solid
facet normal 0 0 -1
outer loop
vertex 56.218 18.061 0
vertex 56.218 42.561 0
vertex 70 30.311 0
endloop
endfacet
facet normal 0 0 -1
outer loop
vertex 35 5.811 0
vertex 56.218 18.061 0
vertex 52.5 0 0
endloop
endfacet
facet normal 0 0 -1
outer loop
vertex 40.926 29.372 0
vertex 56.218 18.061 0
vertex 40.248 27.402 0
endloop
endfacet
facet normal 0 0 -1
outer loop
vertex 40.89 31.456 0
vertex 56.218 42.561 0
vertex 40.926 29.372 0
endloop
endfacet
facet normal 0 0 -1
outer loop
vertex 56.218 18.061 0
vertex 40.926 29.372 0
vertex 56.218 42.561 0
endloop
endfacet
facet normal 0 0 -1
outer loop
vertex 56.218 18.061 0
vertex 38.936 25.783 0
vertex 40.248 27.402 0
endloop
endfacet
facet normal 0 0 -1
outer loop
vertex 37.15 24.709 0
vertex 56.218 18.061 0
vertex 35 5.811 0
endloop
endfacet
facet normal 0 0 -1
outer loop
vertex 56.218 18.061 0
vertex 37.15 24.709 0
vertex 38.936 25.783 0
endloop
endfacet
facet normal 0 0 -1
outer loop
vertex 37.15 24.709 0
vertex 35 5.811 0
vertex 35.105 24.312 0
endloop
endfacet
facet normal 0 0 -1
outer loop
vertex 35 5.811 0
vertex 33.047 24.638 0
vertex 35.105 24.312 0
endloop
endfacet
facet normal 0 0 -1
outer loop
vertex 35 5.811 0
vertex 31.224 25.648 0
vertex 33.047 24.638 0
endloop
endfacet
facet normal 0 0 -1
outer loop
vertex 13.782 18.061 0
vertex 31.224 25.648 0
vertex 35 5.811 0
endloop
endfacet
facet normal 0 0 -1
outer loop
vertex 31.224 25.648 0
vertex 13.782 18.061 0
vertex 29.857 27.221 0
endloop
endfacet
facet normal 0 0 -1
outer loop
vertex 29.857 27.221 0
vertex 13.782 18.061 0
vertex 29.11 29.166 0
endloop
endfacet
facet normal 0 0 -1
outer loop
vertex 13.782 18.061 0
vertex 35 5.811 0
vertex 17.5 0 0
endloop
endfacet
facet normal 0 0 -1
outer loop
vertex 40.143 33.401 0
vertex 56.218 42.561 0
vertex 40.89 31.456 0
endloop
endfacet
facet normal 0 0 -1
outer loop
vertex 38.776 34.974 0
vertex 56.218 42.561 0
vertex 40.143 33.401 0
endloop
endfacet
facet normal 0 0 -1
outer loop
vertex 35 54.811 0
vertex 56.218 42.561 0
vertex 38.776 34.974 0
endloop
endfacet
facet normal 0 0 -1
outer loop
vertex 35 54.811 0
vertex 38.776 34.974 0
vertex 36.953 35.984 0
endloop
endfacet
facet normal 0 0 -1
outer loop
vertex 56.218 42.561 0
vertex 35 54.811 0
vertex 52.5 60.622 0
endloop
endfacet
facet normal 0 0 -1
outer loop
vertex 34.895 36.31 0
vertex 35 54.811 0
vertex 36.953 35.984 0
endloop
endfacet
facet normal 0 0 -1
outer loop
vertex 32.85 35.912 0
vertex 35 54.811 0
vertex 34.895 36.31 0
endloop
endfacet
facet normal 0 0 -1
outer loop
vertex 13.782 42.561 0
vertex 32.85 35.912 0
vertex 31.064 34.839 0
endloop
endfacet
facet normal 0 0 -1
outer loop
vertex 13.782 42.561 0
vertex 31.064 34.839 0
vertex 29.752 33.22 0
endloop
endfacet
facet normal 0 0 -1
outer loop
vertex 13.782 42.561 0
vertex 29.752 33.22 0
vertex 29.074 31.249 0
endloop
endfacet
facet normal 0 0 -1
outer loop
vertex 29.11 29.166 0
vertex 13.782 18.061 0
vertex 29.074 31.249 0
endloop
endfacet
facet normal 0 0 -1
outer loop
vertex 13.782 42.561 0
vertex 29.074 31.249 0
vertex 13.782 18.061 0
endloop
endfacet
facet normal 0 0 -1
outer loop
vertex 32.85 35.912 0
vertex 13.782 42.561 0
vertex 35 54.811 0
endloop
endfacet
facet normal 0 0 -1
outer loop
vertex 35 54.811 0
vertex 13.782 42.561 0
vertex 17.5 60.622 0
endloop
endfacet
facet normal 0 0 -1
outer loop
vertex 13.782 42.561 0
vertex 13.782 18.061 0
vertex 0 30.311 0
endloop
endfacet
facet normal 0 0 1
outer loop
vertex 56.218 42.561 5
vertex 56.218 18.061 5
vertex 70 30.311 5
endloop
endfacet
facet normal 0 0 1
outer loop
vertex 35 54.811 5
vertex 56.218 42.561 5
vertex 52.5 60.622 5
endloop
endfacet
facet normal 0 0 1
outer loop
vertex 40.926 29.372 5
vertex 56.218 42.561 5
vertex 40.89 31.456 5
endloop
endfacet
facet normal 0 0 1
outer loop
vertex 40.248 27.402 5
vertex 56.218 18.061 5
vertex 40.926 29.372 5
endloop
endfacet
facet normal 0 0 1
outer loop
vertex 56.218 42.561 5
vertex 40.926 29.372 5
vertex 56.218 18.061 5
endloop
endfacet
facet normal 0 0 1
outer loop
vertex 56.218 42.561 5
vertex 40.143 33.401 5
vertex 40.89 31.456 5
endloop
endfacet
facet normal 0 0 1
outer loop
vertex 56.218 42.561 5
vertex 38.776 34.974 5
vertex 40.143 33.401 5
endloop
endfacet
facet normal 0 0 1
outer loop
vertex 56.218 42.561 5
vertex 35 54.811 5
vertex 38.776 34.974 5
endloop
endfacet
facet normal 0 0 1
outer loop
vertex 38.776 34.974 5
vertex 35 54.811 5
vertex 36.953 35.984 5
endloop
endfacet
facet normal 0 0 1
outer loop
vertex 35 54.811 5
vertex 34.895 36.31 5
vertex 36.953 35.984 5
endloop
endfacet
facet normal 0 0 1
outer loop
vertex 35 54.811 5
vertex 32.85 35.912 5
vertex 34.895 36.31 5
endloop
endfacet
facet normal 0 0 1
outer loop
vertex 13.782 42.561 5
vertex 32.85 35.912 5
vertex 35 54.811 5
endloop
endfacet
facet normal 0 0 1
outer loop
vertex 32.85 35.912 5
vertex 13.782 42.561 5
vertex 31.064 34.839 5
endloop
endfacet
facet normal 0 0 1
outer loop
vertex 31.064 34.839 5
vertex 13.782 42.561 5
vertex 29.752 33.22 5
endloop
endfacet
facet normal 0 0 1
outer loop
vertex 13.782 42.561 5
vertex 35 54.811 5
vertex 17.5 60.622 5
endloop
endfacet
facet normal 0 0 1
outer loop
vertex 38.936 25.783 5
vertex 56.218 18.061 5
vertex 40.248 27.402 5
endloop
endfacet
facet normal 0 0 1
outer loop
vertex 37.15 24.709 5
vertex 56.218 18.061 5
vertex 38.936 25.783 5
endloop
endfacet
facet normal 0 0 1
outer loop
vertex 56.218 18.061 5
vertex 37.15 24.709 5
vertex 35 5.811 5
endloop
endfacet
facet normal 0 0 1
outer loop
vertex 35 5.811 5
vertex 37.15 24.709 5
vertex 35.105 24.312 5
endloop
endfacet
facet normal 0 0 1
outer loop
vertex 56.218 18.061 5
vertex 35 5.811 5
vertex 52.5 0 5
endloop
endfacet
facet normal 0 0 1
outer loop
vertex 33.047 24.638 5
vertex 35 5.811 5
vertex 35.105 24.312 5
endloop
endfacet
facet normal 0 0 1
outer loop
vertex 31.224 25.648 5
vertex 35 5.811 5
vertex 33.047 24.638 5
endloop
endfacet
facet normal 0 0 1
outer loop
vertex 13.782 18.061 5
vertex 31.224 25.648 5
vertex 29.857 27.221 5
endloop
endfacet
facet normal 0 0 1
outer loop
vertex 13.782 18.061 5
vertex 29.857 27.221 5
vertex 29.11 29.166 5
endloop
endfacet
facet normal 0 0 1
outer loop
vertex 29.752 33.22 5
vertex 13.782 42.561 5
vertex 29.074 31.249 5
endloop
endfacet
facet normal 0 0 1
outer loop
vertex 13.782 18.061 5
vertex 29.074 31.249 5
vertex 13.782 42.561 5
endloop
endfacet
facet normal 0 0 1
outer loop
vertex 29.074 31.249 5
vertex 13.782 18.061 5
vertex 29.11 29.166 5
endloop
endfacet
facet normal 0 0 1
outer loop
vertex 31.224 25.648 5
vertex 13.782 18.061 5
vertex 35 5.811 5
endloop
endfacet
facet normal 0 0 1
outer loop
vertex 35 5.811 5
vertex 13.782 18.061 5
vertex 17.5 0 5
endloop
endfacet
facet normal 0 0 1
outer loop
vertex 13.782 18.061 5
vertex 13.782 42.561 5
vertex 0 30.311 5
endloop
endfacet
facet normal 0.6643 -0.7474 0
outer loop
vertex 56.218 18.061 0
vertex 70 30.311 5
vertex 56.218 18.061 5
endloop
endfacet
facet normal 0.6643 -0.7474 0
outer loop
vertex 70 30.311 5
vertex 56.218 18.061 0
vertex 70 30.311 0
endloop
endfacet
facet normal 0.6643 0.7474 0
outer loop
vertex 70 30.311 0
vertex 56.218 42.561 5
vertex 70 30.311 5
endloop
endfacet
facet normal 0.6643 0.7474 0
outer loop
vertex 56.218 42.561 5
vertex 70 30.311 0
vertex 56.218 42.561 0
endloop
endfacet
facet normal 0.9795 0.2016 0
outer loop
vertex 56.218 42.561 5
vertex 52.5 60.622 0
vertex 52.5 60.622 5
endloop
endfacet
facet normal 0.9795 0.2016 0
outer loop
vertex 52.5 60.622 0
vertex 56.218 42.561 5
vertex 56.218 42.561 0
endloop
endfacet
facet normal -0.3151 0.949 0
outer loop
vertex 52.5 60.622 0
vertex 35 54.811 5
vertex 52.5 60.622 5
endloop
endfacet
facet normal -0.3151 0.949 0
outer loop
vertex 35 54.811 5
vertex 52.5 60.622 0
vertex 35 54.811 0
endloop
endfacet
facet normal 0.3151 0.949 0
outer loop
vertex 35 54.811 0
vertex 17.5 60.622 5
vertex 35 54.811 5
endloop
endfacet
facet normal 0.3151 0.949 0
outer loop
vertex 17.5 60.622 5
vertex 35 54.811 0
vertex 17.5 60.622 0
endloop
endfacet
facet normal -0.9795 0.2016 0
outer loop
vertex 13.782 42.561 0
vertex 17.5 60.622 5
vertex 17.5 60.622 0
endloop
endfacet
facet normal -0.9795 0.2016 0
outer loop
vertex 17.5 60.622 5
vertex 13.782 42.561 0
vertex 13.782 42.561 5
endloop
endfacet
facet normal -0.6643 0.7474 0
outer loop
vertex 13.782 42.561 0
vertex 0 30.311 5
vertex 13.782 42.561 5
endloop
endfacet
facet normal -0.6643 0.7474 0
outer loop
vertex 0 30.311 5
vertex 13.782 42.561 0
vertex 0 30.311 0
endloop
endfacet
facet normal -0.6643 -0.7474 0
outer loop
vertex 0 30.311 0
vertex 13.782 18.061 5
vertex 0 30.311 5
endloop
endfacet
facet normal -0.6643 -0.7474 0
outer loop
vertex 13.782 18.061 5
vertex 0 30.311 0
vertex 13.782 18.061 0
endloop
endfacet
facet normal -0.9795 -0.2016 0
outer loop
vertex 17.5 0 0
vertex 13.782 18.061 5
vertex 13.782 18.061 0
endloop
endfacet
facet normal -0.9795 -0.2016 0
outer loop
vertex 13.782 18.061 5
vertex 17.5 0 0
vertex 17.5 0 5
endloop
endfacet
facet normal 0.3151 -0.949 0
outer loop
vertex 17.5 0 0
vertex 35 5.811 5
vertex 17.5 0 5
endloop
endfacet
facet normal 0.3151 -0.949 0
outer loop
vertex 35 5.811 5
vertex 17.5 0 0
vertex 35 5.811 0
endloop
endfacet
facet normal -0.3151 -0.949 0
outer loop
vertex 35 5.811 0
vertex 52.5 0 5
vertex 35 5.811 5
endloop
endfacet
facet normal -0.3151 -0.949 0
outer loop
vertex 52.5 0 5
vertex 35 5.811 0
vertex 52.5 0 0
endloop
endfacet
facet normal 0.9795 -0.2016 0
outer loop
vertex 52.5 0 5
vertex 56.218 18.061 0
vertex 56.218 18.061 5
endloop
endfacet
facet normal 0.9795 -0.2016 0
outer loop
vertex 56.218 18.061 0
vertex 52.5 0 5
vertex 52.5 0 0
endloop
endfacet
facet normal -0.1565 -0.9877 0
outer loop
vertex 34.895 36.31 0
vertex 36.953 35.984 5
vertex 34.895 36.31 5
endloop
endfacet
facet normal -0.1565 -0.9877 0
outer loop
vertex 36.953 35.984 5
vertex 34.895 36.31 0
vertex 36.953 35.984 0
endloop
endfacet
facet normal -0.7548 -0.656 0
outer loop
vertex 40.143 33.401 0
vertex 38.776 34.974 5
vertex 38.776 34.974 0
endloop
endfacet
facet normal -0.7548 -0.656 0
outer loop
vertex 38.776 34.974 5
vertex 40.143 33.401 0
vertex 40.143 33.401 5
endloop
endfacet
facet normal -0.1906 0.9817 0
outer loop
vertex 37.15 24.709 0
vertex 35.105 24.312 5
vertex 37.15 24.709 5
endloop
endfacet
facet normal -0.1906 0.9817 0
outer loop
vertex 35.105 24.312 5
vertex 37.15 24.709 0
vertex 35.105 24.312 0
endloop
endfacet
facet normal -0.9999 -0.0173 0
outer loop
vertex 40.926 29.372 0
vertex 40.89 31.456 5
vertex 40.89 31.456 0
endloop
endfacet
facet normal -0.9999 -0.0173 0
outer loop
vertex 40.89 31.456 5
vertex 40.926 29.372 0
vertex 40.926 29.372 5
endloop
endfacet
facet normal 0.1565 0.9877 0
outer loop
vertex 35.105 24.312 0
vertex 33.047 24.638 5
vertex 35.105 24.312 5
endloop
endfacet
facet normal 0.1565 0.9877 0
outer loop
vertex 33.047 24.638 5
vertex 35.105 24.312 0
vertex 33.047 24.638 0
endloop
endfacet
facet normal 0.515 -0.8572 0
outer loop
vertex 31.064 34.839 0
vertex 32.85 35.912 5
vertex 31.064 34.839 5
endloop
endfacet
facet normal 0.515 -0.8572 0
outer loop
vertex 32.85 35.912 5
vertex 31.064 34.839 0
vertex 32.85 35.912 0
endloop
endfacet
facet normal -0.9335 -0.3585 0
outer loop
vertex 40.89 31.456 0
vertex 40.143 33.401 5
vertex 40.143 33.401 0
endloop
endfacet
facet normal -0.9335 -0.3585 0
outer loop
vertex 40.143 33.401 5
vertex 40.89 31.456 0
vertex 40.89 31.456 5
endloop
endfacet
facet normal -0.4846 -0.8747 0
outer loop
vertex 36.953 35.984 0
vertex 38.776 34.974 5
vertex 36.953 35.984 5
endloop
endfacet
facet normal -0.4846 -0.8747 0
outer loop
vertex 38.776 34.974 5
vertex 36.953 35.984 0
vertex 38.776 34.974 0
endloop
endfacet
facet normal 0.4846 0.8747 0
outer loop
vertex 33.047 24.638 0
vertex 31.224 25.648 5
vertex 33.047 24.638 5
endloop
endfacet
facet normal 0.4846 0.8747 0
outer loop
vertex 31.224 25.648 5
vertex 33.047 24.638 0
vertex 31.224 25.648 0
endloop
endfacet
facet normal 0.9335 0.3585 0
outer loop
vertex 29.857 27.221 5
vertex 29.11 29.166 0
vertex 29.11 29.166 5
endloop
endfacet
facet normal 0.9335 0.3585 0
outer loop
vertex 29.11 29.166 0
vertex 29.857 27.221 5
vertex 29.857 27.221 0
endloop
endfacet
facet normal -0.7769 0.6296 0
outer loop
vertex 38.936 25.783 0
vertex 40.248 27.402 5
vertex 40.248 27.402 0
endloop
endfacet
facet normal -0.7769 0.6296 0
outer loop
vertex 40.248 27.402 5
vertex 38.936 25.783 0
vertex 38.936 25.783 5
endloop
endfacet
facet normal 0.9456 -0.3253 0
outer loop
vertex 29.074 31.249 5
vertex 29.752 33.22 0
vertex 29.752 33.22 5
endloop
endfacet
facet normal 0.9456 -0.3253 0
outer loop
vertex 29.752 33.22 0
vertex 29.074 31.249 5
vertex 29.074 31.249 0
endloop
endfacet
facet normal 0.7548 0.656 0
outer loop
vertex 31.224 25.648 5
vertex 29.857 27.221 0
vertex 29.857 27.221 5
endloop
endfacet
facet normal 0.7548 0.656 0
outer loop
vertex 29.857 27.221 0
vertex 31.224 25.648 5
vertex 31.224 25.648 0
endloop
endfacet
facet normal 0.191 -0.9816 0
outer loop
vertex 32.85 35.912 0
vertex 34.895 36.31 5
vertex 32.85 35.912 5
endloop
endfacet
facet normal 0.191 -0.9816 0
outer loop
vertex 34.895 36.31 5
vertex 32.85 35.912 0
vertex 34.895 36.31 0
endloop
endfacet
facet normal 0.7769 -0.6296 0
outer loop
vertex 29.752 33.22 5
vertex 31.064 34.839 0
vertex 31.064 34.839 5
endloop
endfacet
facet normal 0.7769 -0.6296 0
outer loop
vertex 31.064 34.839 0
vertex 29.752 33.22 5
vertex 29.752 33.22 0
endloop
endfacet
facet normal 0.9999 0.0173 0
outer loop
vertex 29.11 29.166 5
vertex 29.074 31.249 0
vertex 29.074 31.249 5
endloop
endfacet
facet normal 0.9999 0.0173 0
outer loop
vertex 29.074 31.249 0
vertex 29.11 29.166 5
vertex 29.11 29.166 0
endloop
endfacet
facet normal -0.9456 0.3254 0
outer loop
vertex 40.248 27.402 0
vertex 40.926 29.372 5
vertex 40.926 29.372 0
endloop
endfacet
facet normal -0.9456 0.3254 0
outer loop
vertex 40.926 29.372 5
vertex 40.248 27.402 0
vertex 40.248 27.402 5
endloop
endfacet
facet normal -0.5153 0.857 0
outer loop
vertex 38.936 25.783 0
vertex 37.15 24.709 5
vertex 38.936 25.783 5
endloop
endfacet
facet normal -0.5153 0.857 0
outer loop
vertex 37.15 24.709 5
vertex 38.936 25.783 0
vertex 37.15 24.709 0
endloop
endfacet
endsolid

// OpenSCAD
$fn = 32;

// ----------------------------------------------------------------------
// Star wheel: 6-point blunt, R35
// ----------------------------------------------------------------------

// --- parameters (mm) ---
n_points = 6;             // number of points / teeth
r_out = 35;               // tip radius
r_in = 24.5;              // root radius
bore_r = 6;               // centre bore radius
plate_t = 5;              // plate thickness, Z (extrusion height)
bore_d = 12;              // centre bore diameter

profile = [[0, 30.311], [13.782, 18.061], [17.5, 0], [35, 5.811], [52.5, 0], [56.218, 18.061], [70, 30.311], [56.218, 42.561], [52.5, 60.622], [35, 54.811], [17.5, 60.622], [13.782, 42.561]];  // primary outline, 12 points, counter clockwise
void_1 = [[40.89, 31.456], [40.143, 33.401], [38.776, 34.974], [36.953, 35.984], [34.895, 36.31], [32.85, 35.912], [31.064, 34.839], [29.752, 33.22], [29.074, 31.249], [29.11, 29.166], [29.857, 27.221], [31.224, 25.648], [33.047, 24.638], [35.105, 24.312], [37.15, 24.709], [38.936, 25.783], [40.248, 27.402], [40.926, 29.372]];  // centre bore, 18 points

// --- the one profile operation ---
difference() {
  linear_extrude(height = plate_t) polygon(points = profile);
  translate([0, 0, -1])
    linear_extrude(height = plate_t + 2) polygon(points = void_1);
}
